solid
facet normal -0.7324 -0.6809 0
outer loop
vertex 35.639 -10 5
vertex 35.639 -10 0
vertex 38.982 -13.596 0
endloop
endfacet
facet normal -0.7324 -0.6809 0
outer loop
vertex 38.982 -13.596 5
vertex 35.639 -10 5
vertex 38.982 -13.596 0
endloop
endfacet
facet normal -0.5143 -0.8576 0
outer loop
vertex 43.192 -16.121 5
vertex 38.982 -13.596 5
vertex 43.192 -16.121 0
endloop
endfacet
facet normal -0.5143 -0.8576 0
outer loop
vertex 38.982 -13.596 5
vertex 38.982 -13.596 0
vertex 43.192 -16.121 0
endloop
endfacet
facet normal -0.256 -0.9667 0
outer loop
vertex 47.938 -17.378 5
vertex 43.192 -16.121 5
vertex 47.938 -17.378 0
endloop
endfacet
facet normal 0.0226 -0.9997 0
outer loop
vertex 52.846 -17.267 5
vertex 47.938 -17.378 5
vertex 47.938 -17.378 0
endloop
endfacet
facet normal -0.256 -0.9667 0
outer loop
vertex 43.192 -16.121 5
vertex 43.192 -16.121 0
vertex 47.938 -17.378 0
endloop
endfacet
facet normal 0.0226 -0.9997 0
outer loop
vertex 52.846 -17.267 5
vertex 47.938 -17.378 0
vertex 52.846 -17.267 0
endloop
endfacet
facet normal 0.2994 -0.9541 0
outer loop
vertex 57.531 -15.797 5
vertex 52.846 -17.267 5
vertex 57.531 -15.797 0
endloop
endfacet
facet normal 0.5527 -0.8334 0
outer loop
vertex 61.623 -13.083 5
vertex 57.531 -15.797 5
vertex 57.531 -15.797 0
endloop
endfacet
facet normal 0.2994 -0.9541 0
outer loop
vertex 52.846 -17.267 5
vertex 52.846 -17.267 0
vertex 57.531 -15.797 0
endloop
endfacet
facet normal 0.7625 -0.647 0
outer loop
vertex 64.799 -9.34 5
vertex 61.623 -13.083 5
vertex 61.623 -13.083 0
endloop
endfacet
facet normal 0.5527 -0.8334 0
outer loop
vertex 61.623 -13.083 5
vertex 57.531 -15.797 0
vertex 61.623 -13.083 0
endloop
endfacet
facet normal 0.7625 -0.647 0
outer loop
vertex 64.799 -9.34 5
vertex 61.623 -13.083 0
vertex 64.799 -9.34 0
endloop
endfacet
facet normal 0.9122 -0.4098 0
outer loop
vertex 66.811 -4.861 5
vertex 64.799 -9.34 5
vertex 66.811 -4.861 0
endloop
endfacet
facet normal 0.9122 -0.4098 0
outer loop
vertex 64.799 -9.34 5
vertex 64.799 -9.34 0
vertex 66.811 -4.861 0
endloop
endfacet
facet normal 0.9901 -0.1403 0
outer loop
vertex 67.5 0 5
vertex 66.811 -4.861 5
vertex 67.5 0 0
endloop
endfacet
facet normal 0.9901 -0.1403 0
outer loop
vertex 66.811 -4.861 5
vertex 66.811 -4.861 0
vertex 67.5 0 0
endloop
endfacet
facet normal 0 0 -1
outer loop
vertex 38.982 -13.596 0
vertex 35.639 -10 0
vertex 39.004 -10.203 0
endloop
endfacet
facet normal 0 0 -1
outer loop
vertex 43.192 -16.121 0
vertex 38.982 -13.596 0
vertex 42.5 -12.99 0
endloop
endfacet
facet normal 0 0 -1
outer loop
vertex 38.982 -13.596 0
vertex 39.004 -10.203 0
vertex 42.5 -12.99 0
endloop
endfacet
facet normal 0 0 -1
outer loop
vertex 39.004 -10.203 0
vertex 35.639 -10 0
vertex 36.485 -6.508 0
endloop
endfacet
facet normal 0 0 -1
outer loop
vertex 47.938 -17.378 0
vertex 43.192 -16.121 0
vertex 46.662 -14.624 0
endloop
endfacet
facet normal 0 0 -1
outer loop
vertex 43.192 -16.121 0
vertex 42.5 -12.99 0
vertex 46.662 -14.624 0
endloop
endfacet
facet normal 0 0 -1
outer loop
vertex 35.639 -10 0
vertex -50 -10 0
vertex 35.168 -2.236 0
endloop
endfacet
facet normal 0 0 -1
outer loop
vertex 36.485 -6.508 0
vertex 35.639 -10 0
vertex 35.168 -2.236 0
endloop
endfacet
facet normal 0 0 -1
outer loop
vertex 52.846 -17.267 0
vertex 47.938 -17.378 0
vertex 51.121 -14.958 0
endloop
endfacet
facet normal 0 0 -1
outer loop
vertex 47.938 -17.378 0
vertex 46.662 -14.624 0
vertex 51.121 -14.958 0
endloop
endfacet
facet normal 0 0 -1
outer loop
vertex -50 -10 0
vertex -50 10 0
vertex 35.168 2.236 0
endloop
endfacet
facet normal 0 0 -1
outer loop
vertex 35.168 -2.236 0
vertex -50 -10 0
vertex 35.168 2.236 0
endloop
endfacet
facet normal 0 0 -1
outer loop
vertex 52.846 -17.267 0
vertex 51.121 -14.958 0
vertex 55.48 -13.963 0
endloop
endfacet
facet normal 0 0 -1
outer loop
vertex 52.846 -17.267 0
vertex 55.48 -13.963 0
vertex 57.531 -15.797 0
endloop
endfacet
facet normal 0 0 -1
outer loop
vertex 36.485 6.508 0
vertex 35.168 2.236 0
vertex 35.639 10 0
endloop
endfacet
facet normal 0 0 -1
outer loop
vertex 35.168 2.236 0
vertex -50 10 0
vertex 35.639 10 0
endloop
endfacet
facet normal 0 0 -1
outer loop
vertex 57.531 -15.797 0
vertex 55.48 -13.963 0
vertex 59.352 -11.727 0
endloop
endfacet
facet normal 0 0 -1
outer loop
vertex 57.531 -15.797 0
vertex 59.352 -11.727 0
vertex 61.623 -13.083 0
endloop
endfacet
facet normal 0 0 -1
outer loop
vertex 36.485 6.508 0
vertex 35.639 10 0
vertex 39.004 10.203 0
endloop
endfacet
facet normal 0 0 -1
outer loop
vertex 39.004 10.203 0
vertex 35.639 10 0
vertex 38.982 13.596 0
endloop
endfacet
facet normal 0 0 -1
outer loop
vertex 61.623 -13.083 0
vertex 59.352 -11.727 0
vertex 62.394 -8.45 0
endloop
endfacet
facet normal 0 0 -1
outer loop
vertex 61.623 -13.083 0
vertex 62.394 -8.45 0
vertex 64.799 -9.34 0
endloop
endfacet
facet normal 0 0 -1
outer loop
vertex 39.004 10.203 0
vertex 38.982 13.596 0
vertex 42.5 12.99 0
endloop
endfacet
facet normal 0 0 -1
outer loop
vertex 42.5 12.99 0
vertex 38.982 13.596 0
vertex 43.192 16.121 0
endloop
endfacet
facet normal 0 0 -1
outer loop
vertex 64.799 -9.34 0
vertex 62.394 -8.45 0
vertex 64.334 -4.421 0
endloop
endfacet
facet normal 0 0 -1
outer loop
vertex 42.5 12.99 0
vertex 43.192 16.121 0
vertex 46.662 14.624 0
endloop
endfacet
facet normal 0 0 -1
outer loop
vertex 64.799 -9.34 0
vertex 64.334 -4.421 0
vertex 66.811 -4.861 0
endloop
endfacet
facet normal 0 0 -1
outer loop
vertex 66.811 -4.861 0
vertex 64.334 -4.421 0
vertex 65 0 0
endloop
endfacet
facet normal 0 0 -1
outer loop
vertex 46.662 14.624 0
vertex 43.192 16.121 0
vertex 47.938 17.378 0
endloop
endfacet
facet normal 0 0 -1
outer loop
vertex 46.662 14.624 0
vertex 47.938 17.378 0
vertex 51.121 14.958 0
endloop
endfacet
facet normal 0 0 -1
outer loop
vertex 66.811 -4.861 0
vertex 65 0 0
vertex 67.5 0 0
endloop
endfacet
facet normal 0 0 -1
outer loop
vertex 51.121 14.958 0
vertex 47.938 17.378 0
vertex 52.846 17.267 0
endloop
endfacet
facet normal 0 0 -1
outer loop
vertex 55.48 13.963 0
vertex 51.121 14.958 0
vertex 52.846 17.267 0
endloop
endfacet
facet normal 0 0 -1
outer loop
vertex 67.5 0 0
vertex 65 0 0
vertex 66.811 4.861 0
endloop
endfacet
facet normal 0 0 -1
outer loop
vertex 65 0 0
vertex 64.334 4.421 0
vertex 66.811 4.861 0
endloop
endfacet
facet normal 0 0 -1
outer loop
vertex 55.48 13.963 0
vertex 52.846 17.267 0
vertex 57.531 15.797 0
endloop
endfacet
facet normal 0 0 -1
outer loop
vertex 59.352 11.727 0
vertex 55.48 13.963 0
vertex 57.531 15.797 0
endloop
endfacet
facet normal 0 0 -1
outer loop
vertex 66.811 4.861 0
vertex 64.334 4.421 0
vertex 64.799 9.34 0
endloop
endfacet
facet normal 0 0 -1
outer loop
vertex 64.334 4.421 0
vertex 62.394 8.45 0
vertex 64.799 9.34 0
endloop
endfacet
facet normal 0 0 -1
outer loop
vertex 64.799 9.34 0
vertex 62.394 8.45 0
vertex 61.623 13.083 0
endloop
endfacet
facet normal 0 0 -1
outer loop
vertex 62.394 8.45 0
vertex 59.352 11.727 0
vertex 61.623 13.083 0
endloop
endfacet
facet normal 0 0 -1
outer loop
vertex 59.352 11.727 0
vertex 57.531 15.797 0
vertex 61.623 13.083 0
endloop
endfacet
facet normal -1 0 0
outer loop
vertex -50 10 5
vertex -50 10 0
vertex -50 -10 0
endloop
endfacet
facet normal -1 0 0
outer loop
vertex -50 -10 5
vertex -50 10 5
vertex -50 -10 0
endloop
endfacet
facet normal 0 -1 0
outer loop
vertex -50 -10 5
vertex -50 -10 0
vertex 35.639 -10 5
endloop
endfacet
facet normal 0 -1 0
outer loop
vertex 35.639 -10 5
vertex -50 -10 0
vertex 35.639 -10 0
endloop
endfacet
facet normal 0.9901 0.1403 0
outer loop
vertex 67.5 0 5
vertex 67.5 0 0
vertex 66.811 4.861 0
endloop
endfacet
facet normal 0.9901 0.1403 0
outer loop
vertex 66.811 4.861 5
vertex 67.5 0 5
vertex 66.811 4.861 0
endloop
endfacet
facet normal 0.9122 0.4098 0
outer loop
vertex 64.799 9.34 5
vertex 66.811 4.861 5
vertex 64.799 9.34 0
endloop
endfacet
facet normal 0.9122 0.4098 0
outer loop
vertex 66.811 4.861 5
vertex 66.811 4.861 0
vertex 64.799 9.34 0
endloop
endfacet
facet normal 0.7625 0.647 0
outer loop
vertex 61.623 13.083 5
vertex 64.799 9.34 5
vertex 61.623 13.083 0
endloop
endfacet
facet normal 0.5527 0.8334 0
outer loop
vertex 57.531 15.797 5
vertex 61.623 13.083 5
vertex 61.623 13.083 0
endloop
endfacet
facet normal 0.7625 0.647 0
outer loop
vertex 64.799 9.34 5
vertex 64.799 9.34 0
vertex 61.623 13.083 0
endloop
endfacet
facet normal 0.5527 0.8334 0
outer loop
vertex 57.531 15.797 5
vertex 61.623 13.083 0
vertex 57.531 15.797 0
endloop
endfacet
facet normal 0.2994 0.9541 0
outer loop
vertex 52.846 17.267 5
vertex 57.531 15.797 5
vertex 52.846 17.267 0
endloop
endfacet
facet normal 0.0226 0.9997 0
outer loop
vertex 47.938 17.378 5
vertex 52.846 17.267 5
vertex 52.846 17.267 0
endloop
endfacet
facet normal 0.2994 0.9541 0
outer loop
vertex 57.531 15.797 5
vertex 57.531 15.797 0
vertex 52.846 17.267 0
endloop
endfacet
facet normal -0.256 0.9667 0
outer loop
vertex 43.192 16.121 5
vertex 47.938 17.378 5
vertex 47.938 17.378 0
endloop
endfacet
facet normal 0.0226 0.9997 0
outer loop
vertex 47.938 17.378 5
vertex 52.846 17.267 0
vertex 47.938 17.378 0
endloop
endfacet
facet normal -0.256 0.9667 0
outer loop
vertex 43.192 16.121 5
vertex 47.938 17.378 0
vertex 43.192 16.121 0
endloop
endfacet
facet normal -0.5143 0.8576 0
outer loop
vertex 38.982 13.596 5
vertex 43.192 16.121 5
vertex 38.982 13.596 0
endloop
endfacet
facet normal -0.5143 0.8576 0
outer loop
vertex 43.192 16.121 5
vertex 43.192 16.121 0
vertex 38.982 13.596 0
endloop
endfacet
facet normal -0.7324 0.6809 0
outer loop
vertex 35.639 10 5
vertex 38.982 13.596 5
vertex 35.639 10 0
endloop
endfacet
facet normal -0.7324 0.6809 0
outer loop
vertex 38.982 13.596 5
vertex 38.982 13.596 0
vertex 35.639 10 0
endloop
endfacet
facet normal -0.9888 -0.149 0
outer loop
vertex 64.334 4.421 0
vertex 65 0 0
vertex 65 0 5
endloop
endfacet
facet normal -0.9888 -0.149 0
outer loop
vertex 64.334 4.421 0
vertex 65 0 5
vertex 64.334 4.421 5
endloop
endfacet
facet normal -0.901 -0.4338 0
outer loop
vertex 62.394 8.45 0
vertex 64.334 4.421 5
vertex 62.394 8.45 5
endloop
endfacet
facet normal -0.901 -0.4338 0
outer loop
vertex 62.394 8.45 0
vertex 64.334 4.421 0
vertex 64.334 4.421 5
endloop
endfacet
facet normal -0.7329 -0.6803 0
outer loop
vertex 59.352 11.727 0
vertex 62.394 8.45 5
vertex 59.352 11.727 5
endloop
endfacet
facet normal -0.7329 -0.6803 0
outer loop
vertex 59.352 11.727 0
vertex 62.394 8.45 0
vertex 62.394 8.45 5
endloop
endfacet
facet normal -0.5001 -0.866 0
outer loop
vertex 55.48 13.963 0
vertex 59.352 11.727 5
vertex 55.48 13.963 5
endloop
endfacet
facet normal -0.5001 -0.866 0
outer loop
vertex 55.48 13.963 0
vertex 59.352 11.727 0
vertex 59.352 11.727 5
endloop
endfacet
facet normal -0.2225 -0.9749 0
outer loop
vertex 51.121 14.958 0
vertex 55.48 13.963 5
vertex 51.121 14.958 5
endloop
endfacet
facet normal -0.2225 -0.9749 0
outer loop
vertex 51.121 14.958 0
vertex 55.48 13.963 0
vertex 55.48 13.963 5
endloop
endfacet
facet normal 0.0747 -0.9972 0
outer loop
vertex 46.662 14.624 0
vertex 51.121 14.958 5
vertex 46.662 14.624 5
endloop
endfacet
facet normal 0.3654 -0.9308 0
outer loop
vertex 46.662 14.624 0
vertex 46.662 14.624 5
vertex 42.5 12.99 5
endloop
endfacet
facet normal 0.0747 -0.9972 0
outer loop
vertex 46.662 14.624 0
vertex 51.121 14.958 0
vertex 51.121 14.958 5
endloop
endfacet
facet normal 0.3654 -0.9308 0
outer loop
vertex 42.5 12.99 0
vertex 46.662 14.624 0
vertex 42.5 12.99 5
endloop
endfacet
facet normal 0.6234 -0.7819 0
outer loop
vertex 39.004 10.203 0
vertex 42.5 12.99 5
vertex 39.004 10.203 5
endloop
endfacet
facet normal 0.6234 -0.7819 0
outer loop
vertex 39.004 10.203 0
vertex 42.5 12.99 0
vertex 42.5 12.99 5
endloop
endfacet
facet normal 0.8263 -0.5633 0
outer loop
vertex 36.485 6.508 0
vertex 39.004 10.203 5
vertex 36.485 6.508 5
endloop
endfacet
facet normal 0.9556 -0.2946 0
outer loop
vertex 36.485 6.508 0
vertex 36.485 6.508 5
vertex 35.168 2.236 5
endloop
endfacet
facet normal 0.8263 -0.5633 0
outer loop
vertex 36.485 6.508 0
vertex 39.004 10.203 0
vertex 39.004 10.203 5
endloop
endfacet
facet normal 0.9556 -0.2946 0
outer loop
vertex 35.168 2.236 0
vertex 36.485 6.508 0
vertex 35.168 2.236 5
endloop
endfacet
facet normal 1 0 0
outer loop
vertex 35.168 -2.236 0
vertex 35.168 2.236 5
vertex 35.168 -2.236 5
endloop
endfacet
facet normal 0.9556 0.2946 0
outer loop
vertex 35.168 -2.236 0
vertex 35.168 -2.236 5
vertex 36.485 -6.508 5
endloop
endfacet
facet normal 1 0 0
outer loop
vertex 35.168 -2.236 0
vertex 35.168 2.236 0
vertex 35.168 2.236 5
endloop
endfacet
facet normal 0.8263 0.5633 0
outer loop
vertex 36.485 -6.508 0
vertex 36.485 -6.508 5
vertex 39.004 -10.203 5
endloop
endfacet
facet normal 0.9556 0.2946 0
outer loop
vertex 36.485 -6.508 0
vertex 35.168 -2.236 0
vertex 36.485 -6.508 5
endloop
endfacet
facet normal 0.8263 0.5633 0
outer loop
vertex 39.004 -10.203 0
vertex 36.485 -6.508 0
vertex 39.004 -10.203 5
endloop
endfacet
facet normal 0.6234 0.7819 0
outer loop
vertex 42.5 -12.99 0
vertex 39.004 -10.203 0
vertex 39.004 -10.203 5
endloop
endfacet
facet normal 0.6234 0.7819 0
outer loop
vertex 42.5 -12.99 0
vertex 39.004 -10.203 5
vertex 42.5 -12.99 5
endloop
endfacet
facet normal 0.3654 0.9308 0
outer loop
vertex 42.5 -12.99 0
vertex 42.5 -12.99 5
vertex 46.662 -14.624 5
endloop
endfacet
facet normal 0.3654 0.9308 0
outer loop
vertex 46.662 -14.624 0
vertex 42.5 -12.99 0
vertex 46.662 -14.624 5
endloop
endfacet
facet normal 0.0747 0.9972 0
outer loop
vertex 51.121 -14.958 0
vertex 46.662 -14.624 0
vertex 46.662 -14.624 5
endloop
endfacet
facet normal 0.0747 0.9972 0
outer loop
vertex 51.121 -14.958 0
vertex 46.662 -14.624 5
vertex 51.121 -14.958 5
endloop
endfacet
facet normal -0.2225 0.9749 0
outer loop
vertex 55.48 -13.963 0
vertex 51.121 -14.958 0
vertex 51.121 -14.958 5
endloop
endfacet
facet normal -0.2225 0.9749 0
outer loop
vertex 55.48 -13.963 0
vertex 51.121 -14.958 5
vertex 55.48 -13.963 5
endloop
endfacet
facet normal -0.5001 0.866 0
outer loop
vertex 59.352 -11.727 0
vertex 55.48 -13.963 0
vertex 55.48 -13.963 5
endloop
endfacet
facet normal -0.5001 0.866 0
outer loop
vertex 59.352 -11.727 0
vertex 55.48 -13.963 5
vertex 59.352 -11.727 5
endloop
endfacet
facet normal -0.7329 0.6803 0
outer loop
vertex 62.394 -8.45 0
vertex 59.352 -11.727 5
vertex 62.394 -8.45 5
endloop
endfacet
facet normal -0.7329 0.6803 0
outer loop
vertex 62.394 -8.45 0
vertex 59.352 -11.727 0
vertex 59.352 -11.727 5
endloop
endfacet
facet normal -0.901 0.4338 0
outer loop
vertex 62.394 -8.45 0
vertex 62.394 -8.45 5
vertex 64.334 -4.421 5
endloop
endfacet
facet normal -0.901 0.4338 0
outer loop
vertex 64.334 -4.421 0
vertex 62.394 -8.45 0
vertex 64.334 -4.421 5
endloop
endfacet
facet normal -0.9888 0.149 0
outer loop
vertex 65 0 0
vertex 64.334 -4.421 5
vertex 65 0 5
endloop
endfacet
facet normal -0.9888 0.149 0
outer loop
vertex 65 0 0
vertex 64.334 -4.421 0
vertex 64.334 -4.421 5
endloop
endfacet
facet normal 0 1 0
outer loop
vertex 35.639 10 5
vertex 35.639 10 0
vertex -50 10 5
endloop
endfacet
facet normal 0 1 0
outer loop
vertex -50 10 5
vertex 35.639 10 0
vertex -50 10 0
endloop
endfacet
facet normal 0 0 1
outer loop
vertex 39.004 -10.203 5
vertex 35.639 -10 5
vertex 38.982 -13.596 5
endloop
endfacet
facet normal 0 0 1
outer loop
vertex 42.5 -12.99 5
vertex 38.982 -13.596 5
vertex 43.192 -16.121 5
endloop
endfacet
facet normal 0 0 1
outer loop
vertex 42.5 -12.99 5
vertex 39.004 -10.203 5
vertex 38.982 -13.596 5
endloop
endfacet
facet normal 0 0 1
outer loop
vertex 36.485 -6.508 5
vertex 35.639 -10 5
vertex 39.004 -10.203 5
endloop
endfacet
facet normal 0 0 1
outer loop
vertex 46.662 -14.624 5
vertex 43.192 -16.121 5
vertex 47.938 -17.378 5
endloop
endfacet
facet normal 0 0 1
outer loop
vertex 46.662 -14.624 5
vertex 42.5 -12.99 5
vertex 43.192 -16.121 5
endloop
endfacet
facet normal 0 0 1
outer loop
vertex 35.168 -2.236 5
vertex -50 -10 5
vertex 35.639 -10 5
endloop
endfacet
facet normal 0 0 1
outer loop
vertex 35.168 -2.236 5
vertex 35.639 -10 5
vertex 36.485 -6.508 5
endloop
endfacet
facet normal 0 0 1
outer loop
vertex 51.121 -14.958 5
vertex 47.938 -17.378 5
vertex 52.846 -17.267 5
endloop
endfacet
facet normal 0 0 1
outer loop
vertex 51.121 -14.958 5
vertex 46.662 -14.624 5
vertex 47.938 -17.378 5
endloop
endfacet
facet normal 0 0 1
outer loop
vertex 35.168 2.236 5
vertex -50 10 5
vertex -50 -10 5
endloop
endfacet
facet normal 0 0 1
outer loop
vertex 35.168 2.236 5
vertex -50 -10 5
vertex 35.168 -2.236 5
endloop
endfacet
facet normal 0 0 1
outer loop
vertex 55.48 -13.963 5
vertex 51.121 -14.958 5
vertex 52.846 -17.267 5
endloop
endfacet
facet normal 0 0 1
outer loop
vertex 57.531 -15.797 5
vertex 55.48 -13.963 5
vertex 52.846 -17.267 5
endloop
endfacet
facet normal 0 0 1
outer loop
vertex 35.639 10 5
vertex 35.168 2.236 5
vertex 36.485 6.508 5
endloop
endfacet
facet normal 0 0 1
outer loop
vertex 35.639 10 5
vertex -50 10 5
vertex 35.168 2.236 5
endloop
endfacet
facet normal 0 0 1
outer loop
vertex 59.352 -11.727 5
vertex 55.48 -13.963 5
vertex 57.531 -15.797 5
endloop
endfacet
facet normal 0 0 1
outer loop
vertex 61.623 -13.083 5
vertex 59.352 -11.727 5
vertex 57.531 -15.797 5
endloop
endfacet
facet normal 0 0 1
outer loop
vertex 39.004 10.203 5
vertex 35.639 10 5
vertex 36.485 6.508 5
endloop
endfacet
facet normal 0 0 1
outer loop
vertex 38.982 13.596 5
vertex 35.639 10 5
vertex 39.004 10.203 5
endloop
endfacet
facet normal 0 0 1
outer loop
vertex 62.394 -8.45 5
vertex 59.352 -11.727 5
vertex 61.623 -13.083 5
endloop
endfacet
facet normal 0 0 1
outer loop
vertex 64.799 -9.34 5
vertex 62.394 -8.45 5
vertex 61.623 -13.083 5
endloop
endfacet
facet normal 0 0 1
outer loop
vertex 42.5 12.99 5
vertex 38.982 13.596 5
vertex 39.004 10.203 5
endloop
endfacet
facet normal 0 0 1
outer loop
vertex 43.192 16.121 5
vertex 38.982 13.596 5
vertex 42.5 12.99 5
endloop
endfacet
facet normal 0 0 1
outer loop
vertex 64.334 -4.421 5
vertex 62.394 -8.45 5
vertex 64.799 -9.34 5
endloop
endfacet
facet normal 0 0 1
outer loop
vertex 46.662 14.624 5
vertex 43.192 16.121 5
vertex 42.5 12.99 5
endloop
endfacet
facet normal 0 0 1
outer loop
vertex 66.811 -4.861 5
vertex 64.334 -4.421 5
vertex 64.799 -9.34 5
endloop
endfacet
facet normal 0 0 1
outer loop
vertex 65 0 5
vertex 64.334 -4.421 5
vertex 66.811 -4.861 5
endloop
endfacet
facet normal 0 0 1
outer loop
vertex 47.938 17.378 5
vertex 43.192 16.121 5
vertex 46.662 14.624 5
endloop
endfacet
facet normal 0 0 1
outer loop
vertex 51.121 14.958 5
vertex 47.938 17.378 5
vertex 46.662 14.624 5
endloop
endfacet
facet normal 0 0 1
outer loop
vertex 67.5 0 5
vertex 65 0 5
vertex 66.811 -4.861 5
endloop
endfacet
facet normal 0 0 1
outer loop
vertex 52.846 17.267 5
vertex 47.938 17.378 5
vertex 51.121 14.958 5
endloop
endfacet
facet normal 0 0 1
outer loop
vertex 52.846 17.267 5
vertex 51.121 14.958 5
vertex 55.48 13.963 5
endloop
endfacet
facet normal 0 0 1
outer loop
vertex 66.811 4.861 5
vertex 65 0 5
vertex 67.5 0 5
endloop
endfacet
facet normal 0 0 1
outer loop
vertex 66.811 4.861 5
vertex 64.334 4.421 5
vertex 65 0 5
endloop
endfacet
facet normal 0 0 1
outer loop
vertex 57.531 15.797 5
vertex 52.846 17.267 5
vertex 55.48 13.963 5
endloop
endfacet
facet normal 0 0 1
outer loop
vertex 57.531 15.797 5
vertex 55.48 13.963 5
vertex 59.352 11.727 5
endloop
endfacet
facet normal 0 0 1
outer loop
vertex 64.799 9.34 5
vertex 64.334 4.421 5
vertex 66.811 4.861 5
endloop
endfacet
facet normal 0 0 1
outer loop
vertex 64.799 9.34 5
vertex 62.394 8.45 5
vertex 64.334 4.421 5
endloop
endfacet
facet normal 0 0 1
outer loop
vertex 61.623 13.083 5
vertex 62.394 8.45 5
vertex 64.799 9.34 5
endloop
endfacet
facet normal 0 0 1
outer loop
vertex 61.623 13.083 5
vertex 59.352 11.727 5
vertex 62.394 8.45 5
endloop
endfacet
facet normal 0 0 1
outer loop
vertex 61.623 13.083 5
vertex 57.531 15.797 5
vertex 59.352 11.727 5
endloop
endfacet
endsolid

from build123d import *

# Parameters (mm, degrees)
F0_R     = 15
F1_DEPTH = 5


with BuildPart() as f1:
    # F0 (on Top) → F1 (new body)
    with BuildSketch(Plane.XY):
        with BuildLine():
            Line((35.638593, 10), (-50, 10))
            Line((-50, 10), (-50, -10))
            Line((-50, -10), (35.638593, -10))
            ThreePointArc((35.638593, -10), (32.5, 0), (35.638593, 10))
        make_face()
        with BuildLine():
            ThreePointArc((67.5, 0), (55.240486, 16.696925), (35.638593, 10))
            ThreePointArc((35.638593, 10), (32.5, 0), (35.638593, -10))
            ThreePointArc((35.638593, -10), (55.240486, -16.696925), (67.5, 0))
        make_face()
        with Locations((50, 0)):
            Circle(F0_R, mode=Mode.SUBTRACT)
    extrude(amount=F1_DEPTH)


solid = f1.part
